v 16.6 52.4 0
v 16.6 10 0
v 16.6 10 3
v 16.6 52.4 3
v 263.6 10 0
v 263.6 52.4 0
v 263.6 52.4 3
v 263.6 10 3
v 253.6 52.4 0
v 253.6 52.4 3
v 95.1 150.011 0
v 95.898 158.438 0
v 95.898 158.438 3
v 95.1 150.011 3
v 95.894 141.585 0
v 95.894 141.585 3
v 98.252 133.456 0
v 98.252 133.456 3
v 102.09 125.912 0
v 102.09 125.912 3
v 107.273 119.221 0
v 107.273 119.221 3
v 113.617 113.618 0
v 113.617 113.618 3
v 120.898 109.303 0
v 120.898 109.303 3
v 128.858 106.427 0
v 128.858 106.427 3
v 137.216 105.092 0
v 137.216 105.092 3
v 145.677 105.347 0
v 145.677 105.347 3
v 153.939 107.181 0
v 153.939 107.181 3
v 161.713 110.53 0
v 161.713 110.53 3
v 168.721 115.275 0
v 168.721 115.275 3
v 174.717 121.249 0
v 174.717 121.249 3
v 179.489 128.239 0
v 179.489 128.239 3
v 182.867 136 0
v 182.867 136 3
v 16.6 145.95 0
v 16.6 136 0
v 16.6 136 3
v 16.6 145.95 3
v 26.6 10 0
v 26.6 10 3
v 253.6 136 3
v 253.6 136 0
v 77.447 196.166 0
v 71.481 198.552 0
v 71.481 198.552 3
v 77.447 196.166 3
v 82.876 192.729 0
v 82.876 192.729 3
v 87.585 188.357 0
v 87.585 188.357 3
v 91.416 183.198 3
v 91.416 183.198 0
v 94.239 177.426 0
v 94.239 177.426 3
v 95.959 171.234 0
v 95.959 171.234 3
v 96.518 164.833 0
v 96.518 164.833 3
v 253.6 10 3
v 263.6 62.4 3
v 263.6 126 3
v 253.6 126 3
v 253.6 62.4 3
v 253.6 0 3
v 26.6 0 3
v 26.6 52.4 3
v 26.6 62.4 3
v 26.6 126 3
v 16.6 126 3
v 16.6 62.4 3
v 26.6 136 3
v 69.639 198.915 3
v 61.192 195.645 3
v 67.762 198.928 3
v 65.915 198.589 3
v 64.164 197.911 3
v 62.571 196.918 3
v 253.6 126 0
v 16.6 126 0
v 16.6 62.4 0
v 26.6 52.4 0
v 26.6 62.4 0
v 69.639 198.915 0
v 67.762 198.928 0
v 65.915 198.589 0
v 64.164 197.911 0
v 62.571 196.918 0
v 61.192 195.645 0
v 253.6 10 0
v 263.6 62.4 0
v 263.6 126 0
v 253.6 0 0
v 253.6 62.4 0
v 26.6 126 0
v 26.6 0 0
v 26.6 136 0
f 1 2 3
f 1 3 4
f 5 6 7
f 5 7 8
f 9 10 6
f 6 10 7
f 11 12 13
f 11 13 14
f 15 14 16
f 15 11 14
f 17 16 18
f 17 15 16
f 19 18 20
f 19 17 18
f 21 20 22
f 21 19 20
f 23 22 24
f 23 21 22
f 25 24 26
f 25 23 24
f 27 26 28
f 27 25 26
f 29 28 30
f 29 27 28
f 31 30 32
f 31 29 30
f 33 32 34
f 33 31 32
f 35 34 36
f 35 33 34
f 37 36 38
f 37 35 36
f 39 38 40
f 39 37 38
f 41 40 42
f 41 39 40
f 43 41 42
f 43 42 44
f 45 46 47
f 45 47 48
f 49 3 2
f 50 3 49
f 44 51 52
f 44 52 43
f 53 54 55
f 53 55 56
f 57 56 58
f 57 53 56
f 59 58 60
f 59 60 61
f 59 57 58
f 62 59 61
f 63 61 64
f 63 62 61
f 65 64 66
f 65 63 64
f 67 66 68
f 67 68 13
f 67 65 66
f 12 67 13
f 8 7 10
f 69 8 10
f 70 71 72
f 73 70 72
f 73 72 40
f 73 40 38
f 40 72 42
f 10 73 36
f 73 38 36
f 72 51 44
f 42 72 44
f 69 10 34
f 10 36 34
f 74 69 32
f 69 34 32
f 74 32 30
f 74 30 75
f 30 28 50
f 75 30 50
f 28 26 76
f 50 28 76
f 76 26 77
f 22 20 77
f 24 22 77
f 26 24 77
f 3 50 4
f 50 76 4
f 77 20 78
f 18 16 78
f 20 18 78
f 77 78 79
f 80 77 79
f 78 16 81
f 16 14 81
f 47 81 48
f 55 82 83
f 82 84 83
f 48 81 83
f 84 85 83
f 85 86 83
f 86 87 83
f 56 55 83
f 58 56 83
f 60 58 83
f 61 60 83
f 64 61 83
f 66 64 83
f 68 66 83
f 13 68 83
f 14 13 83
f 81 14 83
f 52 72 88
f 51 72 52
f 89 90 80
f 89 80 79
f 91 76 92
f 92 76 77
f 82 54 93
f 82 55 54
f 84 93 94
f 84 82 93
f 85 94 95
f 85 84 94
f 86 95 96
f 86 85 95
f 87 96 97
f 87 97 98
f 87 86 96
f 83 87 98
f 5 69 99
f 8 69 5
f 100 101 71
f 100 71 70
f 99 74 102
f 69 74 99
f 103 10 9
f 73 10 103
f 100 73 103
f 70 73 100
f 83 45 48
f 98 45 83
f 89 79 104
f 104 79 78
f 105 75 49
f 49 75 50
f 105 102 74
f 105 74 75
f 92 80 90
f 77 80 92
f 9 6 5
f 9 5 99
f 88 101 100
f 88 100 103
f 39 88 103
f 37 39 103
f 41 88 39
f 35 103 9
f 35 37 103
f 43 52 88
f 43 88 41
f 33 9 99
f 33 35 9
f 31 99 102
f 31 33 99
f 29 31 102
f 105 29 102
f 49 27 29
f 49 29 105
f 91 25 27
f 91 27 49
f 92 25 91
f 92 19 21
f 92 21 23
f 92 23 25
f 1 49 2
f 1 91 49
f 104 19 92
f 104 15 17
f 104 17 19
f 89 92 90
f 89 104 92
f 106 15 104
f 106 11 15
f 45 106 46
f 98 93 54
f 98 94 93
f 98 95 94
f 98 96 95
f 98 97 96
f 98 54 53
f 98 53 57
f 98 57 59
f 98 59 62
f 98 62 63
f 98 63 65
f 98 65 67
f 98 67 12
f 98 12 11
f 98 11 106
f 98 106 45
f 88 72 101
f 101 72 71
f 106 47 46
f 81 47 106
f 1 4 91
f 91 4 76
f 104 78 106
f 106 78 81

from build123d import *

# Parameters (mm, degrees)
BOSS_EXTRU_1_DEPTH      = 3
ENL_V_MAT_EXTRU_1_DEPTH = 345.268848431
ESQUISSE4_W             = 10
ESQUISSE4_H             = 10
ENL_V_MAT_EXTRU_2_DEPTH = 331.898715622
ENL_V_MAT_EXTRU_3_DEPTH = 331.898715622
CONG_2_R                = 10
ENL_V_MAT_EXTRU_4_DEPTH = 331.274729043


with BuildPart() as part:
    # Esquisse1 → Boss.-Extru.1 (new body)
    with BuildSketch(Plane.XY):
        Polygon((0, 0), (0, 127.45), (65.1, 200), (215.1, 200), (280.2, 127.45), (280.2, 0), align=None)
    extrude(amount=BOSS_EXTRU_1_DEPTH)

    # Esquisse2 → Enlèv. mat.-Extru.1 (cut, through all)
    with BuildSketch(Plane(origin=(0, 0, 0), x_dir=(-1, 0, 0), z_dir=(0, 0, -1))):
        Polygon((-16.6, 0), (-16.6, 145.969439351), (0, 127.45), (0, 0), align=None)
        Polygon((-280.2, 127.45), (-263.6, 145.969439351), (-263.6, 0), (-280.2, 0), align=None)
    extrude(amount=-ENL_V_MAT_EXTRU_1_DEPTH, mode=Mode.SUBTRACT)

    # Esquisse4 → Enlèv. mat.-Extru.2 (cut, through all)
    with BuildSketch(Plane.XY.offset(3)):
        with Locations((21.6, 5)):
            Rectangle(ESQUISSE4_W, ESQUISSE4_H)
        with Locations((21.6, 57.4)):
            Rectangle(ESQUISSE4_W, ESQUISSE4_H)
        with Locations((258.6, 131)):
            Rectangle(ESQUISSE4_W, ESQUISSE4_H)
        with Locations((21.6, 131)):
            Rectangle(ESQUISSE4_W, ESQUISSE4_H)
        with Locations((258.6, 57.4)):
            Rectangle(ESQUISSE4_W, ESQUISSE4_H)
        with Locations((258.6, 5)):
            Rectangle(ESQUISSE4_W, ESQUISSE4_H)
    extrude(amount=-ENL_V_MAT_EXTRU_2_DEPTH, mode=Mode.SUBTRACT)

    # Esquisse5 → Enlèv. mat.-Extru.3 (cut, through all)
    with BuildSketch(Plane.XY.offset(3)):
        with BuildLine():
            ThreePointArc((184.301907128, 158.4375), (191.711856965, 187.308210372), (218.681168228, 200))
            Line((218.681168228, 200), (215.1, 200))
            Line((215.1, 200), (140.1, 200))
            Line((140.1, 200), (65.1, 200))
            Line((65.1, 200), (61.518831772, 200))
            ThreePointArc((61.518831772, 200), (88.488143035, 187.308210372), (95.898092872, 158.4375))
            ThreePointArc((95.898092872, 158.4375), (140.1, 105), (184.301907128, 158.4375))
        make_face()
    extrude(amount=-ENL_V_MAT_EXTRU_3_DEPTH, mode=Mode.SUBTRACT)

    # Congé2
    cong_2_edges = [part.edges().sort_by_distance(p)[0] for p in [
        (64.94882545, 199.831525137, 1.5),
        (215.25117455, 199.831525137, 1.5),
    ]]
    fillet(cong_2_edges, radius=CONG_2_R)

    # Esquisse6 → Enlèv. mat.-Extru.4 (cut, through all)
    with BuildSketch(Plane.XY.offset(3)):
        Polygon((253.6, 136), (162.037145506, 136), (157.83002171, 194.744262237), (193.590573974, 207.065124781), (241.070971096, 207.065124781), (283.142209053, 167.698466408), (280.738138313, 136), (273.47498576, 135.479830357), align=None)
    extrude(amount=-ENL_V_MAT_EXTRU_4_DEPTH, mode=Mode.SUBTRACT)


solid = part.part
